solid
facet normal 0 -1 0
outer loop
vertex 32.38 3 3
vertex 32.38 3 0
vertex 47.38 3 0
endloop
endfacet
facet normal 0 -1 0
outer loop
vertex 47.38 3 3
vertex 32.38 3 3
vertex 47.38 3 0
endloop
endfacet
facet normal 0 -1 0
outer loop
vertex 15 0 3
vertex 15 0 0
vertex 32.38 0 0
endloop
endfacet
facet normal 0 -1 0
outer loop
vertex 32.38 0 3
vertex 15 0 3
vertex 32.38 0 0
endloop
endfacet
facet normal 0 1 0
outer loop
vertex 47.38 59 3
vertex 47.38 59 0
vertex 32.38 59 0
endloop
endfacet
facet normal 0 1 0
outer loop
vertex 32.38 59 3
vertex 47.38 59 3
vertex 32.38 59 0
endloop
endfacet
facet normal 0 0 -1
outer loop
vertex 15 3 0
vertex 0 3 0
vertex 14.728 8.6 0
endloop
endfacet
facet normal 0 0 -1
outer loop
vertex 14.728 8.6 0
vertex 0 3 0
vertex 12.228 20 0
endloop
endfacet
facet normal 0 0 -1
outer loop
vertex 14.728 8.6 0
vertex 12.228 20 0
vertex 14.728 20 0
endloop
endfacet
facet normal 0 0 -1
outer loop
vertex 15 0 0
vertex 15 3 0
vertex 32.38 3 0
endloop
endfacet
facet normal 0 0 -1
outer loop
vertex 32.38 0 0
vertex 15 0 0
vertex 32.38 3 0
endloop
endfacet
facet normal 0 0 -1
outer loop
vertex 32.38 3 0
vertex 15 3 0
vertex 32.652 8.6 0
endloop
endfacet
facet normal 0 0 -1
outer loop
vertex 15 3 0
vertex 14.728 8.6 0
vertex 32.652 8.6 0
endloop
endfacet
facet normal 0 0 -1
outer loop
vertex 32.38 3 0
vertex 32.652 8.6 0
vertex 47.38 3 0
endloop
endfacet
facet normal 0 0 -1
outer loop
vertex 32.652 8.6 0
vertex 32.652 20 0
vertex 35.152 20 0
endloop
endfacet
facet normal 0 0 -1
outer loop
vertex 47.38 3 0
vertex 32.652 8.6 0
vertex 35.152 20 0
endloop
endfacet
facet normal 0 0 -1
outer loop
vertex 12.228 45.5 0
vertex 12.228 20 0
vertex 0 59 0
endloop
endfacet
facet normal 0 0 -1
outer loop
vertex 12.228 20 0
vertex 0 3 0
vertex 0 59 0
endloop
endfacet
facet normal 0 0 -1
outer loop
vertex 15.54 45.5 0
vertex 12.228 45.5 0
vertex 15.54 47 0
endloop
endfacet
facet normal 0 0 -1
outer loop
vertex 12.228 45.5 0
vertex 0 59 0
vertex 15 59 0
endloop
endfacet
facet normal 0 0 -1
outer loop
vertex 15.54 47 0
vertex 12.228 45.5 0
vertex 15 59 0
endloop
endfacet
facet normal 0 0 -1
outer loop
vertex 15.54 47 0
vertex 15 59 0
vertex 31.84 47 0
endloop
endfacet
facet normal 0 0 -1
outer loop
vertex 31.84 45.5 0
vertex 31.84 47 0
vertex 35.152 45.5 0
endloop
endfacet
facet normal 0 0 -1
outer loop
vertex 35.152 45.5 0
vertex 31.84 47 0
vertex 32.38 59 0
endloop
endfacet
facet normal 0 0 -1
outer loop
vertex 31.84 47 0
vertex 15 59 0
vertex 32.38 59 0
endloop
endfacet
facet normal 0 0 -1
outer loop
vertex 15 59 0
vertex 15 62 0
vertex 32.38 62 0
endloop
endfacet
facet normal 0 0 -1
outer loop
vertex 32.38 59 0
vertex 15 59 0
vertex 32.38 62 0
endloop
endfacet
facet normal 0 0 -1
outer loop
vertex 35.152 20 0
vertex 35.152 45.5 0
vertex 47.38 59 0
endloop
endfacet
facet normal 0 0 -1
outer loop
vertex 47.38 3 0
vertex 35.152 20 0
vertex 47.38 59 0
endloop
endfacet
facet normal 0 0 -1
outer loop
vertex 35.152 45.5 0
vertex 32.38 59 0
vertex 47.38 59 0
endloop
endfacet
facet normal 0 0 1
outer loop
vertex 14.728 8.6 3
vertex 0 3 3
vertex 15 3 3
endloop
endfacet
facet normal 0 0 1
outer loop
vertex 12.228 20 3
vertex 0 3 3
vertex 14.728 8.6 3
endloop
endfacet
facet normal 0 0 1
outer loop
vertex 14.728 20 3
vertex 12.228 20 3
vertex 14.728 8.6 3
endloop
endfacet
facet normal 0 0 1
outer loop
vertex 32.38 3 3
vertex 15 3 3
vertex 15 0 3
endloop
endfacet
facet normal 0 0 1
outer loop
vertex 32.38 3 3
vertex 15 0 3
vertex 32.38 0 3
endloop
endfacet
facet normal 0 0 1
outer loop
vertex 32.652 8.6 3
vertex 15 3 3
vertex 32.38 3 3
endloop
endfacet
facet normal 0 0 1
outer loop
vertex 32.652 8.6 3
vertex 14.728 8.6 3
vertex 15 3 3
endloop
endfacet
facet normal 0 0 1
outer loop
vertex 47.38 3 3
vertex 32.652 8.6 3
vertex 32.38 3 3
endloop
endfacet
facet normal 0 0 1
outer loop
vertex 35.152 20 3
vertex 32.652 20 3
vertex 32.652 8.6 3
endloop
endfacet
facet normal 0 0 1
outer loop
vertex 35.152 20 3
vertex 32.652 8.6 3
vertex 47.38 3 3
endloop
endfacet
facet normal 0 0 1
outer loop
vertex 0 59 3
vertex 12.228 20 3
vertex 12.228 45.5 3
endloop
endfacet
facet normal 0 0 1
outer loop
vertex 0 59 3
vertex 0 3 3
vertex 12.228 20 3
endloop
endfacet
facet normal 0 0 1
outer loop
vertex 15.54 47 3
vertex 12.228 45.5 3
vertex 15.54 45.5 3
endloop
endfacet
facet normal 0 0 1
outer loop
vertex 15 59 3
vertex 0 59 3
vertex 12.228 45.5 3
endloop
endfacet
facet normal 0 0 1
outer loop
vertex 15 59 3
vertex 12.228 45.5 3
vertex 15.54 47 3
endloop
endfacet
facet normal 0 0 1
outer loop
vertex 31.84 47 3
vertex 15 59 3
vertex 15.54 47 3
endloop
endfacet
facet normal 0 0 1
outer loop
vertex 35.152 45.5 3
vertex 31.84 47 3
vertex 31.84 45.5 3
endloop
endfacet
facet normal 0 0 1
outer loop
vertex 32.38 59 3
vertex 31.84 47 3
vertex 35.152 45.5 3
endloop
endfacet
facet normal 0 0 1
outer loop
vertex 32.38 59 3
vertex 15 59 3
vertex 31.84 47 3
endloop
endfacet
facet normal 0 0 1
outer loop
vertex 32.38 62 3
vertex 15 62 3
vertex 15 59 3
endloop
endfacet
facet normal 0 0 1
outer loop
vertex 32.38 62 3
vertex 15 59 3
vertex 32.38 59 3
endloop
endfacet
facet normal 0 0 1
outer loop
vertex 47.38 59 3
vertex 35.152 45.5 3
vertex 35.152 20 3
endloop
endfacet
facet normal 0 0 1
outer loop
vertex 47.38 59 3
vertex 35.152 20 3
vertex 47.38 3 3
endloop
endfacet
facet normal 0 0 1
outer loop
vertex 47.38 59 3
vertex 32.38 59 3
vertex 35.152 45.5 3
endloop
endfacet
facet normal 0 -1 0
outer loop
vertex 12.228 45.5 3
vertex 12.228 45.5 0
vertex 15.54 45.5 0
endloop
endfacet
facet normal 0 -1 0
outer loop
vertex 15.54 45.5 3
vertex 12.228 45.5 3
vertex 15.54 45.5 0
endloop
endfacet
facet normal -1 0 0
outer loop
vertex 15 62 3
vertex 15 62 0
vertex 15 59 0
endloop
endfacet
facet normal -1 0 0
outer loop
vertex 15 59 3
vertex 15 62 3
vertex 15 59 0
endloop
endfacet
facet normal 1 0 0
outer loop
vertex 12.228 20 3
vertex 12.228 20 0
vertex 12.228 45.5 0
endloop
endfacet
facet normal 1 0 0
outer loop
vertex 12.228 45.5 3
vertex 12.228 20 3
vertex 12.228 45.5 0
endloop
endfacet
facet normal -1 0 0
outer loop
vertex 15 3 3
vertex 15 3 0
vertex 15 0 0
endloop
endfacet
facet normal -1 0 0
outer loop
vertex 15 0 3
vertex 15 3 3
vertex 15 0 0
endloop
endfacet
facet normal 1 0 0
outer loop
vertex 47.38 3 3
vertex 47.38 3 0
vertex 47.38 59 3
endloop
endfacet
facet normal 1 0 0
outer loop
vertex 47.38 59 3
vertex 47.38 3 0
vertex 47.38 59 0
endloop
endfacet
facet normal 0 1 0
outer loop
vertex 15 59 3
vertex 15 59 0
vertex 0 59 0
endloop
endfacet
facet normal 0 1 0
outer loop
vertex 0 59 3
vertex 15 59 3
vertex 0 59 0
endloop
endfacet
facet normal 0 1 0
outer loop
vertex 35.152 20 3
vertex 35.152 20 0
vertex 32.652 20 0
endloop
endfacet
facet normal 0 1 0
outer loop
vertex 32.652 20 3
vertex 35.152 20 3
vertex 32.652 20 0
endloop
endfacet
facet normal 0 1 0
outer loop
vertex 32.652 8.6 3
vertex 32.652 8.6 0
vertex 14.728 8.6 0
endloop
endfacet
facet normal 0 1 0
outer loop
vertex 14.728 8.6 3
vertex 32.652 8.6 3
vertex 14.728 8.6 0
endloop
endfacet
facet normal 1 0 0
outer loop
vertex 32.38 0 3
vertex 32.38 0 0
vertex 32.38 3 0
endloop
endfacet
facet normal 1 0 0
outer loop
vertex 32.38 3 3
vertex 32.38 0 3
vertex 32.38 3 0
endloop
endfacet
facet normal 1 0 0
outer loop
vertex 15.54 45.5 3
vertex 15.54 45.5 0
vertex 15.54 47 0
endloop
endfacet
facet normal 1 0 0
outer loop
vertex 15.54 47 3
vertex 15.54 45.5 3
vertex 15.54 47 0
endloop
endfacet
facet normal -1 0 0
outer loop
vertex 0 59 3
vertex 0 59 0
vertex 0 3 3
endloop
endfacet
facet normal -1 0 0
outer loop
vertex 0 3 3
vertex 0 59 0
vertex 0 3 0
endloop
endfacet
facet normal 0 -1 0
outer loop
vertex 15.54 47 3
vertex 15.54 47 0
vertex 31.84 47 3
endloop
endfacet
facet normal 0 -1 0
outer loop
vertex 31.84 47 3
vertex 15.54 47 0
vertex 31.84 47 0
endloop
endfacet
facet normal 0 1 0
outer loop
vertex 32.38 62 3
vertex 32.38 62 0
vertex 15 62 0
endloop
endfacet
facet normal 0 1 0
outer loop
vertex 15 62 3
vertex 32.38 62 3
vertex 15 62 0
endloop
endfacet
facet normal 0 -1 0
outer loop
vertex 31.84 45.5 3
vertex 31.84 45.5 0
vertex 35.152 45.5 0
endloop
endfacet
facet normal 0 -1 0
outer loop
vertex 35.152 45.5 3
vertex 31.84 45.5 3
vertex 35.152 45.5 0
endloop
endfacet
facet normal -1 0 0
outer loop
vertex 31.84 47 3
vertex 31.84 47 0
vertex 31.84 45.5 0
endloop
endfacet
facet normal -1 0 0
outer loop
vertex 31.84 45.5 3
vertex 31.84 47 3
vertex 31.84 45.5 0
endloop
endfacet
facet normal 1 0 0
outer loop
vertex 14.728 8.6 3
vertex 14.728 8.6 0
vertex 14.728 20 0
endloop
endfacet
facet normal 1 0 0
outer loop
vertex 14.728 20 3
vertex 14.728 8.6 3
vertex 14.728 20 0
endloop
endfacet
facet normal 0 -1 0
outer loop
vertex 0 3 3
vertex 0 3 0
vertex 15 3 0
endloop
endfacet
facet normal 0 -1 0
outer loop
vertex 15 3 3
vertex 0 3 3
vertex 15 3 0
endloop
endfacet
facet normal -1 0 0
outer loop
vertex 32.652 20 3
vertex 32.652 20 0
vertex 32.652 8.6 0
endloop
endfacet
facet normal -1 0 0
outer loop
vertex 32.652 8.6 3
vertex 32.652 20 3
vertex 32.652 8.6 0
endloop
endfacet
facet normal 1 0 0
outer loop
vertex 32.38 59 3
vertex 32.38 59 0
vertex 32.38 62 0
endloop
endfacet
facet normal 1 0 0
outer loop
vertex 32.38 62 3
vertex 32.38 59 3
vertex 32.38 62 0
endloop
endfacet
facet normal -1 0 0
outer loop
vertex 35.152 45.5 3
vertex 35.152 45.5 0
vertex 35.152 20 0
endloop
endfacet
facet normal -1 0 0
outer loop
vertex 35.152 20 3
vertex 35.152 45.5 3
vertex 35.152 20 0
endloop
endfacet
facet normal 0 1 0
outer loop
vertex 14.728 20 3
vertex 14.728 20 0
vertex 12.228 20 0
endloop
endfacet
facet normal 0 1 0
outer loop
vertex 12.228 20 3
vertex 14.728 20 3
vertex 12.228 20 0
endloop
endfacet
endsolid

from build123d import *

# Parameters (mm, degrees)
P_IDAT_VYSUNUT_M1_DEPTH = 3


with BuildPart() as part:
    # Skica1 → Přidat vysunutím1 (new body)
    with BuildSketch(Plane.XY):
        Polygon((0, 3), (15, 3), (15, 0), (32.38, 0), (32.38, 3), (47.38, 3), (47.38, 59), (32.38, 59), (32.38, 62), (15, 62), (15, 59), (0, 59), align=None)
        Polygon((12.227967454, 31), (12.227967454, 45.5), (15.539999999, 45.5), (15.539999999, 47), (31.839999999, 47), (31.839999999, 45.5), (35.152032457, 45.5), (35.152032457, 31), (35.152032457, 20), (32.652032457, 20), (32.652032457, 8.6), (14.727967454, 8.6), (14.727967454, 20), (12.227967454, 20), align=None, mode=Mode.SUBTRACT)
    extrude(amount=P_IDAT_VYSUNUT_M1_DEPTH)


solid = part.part
